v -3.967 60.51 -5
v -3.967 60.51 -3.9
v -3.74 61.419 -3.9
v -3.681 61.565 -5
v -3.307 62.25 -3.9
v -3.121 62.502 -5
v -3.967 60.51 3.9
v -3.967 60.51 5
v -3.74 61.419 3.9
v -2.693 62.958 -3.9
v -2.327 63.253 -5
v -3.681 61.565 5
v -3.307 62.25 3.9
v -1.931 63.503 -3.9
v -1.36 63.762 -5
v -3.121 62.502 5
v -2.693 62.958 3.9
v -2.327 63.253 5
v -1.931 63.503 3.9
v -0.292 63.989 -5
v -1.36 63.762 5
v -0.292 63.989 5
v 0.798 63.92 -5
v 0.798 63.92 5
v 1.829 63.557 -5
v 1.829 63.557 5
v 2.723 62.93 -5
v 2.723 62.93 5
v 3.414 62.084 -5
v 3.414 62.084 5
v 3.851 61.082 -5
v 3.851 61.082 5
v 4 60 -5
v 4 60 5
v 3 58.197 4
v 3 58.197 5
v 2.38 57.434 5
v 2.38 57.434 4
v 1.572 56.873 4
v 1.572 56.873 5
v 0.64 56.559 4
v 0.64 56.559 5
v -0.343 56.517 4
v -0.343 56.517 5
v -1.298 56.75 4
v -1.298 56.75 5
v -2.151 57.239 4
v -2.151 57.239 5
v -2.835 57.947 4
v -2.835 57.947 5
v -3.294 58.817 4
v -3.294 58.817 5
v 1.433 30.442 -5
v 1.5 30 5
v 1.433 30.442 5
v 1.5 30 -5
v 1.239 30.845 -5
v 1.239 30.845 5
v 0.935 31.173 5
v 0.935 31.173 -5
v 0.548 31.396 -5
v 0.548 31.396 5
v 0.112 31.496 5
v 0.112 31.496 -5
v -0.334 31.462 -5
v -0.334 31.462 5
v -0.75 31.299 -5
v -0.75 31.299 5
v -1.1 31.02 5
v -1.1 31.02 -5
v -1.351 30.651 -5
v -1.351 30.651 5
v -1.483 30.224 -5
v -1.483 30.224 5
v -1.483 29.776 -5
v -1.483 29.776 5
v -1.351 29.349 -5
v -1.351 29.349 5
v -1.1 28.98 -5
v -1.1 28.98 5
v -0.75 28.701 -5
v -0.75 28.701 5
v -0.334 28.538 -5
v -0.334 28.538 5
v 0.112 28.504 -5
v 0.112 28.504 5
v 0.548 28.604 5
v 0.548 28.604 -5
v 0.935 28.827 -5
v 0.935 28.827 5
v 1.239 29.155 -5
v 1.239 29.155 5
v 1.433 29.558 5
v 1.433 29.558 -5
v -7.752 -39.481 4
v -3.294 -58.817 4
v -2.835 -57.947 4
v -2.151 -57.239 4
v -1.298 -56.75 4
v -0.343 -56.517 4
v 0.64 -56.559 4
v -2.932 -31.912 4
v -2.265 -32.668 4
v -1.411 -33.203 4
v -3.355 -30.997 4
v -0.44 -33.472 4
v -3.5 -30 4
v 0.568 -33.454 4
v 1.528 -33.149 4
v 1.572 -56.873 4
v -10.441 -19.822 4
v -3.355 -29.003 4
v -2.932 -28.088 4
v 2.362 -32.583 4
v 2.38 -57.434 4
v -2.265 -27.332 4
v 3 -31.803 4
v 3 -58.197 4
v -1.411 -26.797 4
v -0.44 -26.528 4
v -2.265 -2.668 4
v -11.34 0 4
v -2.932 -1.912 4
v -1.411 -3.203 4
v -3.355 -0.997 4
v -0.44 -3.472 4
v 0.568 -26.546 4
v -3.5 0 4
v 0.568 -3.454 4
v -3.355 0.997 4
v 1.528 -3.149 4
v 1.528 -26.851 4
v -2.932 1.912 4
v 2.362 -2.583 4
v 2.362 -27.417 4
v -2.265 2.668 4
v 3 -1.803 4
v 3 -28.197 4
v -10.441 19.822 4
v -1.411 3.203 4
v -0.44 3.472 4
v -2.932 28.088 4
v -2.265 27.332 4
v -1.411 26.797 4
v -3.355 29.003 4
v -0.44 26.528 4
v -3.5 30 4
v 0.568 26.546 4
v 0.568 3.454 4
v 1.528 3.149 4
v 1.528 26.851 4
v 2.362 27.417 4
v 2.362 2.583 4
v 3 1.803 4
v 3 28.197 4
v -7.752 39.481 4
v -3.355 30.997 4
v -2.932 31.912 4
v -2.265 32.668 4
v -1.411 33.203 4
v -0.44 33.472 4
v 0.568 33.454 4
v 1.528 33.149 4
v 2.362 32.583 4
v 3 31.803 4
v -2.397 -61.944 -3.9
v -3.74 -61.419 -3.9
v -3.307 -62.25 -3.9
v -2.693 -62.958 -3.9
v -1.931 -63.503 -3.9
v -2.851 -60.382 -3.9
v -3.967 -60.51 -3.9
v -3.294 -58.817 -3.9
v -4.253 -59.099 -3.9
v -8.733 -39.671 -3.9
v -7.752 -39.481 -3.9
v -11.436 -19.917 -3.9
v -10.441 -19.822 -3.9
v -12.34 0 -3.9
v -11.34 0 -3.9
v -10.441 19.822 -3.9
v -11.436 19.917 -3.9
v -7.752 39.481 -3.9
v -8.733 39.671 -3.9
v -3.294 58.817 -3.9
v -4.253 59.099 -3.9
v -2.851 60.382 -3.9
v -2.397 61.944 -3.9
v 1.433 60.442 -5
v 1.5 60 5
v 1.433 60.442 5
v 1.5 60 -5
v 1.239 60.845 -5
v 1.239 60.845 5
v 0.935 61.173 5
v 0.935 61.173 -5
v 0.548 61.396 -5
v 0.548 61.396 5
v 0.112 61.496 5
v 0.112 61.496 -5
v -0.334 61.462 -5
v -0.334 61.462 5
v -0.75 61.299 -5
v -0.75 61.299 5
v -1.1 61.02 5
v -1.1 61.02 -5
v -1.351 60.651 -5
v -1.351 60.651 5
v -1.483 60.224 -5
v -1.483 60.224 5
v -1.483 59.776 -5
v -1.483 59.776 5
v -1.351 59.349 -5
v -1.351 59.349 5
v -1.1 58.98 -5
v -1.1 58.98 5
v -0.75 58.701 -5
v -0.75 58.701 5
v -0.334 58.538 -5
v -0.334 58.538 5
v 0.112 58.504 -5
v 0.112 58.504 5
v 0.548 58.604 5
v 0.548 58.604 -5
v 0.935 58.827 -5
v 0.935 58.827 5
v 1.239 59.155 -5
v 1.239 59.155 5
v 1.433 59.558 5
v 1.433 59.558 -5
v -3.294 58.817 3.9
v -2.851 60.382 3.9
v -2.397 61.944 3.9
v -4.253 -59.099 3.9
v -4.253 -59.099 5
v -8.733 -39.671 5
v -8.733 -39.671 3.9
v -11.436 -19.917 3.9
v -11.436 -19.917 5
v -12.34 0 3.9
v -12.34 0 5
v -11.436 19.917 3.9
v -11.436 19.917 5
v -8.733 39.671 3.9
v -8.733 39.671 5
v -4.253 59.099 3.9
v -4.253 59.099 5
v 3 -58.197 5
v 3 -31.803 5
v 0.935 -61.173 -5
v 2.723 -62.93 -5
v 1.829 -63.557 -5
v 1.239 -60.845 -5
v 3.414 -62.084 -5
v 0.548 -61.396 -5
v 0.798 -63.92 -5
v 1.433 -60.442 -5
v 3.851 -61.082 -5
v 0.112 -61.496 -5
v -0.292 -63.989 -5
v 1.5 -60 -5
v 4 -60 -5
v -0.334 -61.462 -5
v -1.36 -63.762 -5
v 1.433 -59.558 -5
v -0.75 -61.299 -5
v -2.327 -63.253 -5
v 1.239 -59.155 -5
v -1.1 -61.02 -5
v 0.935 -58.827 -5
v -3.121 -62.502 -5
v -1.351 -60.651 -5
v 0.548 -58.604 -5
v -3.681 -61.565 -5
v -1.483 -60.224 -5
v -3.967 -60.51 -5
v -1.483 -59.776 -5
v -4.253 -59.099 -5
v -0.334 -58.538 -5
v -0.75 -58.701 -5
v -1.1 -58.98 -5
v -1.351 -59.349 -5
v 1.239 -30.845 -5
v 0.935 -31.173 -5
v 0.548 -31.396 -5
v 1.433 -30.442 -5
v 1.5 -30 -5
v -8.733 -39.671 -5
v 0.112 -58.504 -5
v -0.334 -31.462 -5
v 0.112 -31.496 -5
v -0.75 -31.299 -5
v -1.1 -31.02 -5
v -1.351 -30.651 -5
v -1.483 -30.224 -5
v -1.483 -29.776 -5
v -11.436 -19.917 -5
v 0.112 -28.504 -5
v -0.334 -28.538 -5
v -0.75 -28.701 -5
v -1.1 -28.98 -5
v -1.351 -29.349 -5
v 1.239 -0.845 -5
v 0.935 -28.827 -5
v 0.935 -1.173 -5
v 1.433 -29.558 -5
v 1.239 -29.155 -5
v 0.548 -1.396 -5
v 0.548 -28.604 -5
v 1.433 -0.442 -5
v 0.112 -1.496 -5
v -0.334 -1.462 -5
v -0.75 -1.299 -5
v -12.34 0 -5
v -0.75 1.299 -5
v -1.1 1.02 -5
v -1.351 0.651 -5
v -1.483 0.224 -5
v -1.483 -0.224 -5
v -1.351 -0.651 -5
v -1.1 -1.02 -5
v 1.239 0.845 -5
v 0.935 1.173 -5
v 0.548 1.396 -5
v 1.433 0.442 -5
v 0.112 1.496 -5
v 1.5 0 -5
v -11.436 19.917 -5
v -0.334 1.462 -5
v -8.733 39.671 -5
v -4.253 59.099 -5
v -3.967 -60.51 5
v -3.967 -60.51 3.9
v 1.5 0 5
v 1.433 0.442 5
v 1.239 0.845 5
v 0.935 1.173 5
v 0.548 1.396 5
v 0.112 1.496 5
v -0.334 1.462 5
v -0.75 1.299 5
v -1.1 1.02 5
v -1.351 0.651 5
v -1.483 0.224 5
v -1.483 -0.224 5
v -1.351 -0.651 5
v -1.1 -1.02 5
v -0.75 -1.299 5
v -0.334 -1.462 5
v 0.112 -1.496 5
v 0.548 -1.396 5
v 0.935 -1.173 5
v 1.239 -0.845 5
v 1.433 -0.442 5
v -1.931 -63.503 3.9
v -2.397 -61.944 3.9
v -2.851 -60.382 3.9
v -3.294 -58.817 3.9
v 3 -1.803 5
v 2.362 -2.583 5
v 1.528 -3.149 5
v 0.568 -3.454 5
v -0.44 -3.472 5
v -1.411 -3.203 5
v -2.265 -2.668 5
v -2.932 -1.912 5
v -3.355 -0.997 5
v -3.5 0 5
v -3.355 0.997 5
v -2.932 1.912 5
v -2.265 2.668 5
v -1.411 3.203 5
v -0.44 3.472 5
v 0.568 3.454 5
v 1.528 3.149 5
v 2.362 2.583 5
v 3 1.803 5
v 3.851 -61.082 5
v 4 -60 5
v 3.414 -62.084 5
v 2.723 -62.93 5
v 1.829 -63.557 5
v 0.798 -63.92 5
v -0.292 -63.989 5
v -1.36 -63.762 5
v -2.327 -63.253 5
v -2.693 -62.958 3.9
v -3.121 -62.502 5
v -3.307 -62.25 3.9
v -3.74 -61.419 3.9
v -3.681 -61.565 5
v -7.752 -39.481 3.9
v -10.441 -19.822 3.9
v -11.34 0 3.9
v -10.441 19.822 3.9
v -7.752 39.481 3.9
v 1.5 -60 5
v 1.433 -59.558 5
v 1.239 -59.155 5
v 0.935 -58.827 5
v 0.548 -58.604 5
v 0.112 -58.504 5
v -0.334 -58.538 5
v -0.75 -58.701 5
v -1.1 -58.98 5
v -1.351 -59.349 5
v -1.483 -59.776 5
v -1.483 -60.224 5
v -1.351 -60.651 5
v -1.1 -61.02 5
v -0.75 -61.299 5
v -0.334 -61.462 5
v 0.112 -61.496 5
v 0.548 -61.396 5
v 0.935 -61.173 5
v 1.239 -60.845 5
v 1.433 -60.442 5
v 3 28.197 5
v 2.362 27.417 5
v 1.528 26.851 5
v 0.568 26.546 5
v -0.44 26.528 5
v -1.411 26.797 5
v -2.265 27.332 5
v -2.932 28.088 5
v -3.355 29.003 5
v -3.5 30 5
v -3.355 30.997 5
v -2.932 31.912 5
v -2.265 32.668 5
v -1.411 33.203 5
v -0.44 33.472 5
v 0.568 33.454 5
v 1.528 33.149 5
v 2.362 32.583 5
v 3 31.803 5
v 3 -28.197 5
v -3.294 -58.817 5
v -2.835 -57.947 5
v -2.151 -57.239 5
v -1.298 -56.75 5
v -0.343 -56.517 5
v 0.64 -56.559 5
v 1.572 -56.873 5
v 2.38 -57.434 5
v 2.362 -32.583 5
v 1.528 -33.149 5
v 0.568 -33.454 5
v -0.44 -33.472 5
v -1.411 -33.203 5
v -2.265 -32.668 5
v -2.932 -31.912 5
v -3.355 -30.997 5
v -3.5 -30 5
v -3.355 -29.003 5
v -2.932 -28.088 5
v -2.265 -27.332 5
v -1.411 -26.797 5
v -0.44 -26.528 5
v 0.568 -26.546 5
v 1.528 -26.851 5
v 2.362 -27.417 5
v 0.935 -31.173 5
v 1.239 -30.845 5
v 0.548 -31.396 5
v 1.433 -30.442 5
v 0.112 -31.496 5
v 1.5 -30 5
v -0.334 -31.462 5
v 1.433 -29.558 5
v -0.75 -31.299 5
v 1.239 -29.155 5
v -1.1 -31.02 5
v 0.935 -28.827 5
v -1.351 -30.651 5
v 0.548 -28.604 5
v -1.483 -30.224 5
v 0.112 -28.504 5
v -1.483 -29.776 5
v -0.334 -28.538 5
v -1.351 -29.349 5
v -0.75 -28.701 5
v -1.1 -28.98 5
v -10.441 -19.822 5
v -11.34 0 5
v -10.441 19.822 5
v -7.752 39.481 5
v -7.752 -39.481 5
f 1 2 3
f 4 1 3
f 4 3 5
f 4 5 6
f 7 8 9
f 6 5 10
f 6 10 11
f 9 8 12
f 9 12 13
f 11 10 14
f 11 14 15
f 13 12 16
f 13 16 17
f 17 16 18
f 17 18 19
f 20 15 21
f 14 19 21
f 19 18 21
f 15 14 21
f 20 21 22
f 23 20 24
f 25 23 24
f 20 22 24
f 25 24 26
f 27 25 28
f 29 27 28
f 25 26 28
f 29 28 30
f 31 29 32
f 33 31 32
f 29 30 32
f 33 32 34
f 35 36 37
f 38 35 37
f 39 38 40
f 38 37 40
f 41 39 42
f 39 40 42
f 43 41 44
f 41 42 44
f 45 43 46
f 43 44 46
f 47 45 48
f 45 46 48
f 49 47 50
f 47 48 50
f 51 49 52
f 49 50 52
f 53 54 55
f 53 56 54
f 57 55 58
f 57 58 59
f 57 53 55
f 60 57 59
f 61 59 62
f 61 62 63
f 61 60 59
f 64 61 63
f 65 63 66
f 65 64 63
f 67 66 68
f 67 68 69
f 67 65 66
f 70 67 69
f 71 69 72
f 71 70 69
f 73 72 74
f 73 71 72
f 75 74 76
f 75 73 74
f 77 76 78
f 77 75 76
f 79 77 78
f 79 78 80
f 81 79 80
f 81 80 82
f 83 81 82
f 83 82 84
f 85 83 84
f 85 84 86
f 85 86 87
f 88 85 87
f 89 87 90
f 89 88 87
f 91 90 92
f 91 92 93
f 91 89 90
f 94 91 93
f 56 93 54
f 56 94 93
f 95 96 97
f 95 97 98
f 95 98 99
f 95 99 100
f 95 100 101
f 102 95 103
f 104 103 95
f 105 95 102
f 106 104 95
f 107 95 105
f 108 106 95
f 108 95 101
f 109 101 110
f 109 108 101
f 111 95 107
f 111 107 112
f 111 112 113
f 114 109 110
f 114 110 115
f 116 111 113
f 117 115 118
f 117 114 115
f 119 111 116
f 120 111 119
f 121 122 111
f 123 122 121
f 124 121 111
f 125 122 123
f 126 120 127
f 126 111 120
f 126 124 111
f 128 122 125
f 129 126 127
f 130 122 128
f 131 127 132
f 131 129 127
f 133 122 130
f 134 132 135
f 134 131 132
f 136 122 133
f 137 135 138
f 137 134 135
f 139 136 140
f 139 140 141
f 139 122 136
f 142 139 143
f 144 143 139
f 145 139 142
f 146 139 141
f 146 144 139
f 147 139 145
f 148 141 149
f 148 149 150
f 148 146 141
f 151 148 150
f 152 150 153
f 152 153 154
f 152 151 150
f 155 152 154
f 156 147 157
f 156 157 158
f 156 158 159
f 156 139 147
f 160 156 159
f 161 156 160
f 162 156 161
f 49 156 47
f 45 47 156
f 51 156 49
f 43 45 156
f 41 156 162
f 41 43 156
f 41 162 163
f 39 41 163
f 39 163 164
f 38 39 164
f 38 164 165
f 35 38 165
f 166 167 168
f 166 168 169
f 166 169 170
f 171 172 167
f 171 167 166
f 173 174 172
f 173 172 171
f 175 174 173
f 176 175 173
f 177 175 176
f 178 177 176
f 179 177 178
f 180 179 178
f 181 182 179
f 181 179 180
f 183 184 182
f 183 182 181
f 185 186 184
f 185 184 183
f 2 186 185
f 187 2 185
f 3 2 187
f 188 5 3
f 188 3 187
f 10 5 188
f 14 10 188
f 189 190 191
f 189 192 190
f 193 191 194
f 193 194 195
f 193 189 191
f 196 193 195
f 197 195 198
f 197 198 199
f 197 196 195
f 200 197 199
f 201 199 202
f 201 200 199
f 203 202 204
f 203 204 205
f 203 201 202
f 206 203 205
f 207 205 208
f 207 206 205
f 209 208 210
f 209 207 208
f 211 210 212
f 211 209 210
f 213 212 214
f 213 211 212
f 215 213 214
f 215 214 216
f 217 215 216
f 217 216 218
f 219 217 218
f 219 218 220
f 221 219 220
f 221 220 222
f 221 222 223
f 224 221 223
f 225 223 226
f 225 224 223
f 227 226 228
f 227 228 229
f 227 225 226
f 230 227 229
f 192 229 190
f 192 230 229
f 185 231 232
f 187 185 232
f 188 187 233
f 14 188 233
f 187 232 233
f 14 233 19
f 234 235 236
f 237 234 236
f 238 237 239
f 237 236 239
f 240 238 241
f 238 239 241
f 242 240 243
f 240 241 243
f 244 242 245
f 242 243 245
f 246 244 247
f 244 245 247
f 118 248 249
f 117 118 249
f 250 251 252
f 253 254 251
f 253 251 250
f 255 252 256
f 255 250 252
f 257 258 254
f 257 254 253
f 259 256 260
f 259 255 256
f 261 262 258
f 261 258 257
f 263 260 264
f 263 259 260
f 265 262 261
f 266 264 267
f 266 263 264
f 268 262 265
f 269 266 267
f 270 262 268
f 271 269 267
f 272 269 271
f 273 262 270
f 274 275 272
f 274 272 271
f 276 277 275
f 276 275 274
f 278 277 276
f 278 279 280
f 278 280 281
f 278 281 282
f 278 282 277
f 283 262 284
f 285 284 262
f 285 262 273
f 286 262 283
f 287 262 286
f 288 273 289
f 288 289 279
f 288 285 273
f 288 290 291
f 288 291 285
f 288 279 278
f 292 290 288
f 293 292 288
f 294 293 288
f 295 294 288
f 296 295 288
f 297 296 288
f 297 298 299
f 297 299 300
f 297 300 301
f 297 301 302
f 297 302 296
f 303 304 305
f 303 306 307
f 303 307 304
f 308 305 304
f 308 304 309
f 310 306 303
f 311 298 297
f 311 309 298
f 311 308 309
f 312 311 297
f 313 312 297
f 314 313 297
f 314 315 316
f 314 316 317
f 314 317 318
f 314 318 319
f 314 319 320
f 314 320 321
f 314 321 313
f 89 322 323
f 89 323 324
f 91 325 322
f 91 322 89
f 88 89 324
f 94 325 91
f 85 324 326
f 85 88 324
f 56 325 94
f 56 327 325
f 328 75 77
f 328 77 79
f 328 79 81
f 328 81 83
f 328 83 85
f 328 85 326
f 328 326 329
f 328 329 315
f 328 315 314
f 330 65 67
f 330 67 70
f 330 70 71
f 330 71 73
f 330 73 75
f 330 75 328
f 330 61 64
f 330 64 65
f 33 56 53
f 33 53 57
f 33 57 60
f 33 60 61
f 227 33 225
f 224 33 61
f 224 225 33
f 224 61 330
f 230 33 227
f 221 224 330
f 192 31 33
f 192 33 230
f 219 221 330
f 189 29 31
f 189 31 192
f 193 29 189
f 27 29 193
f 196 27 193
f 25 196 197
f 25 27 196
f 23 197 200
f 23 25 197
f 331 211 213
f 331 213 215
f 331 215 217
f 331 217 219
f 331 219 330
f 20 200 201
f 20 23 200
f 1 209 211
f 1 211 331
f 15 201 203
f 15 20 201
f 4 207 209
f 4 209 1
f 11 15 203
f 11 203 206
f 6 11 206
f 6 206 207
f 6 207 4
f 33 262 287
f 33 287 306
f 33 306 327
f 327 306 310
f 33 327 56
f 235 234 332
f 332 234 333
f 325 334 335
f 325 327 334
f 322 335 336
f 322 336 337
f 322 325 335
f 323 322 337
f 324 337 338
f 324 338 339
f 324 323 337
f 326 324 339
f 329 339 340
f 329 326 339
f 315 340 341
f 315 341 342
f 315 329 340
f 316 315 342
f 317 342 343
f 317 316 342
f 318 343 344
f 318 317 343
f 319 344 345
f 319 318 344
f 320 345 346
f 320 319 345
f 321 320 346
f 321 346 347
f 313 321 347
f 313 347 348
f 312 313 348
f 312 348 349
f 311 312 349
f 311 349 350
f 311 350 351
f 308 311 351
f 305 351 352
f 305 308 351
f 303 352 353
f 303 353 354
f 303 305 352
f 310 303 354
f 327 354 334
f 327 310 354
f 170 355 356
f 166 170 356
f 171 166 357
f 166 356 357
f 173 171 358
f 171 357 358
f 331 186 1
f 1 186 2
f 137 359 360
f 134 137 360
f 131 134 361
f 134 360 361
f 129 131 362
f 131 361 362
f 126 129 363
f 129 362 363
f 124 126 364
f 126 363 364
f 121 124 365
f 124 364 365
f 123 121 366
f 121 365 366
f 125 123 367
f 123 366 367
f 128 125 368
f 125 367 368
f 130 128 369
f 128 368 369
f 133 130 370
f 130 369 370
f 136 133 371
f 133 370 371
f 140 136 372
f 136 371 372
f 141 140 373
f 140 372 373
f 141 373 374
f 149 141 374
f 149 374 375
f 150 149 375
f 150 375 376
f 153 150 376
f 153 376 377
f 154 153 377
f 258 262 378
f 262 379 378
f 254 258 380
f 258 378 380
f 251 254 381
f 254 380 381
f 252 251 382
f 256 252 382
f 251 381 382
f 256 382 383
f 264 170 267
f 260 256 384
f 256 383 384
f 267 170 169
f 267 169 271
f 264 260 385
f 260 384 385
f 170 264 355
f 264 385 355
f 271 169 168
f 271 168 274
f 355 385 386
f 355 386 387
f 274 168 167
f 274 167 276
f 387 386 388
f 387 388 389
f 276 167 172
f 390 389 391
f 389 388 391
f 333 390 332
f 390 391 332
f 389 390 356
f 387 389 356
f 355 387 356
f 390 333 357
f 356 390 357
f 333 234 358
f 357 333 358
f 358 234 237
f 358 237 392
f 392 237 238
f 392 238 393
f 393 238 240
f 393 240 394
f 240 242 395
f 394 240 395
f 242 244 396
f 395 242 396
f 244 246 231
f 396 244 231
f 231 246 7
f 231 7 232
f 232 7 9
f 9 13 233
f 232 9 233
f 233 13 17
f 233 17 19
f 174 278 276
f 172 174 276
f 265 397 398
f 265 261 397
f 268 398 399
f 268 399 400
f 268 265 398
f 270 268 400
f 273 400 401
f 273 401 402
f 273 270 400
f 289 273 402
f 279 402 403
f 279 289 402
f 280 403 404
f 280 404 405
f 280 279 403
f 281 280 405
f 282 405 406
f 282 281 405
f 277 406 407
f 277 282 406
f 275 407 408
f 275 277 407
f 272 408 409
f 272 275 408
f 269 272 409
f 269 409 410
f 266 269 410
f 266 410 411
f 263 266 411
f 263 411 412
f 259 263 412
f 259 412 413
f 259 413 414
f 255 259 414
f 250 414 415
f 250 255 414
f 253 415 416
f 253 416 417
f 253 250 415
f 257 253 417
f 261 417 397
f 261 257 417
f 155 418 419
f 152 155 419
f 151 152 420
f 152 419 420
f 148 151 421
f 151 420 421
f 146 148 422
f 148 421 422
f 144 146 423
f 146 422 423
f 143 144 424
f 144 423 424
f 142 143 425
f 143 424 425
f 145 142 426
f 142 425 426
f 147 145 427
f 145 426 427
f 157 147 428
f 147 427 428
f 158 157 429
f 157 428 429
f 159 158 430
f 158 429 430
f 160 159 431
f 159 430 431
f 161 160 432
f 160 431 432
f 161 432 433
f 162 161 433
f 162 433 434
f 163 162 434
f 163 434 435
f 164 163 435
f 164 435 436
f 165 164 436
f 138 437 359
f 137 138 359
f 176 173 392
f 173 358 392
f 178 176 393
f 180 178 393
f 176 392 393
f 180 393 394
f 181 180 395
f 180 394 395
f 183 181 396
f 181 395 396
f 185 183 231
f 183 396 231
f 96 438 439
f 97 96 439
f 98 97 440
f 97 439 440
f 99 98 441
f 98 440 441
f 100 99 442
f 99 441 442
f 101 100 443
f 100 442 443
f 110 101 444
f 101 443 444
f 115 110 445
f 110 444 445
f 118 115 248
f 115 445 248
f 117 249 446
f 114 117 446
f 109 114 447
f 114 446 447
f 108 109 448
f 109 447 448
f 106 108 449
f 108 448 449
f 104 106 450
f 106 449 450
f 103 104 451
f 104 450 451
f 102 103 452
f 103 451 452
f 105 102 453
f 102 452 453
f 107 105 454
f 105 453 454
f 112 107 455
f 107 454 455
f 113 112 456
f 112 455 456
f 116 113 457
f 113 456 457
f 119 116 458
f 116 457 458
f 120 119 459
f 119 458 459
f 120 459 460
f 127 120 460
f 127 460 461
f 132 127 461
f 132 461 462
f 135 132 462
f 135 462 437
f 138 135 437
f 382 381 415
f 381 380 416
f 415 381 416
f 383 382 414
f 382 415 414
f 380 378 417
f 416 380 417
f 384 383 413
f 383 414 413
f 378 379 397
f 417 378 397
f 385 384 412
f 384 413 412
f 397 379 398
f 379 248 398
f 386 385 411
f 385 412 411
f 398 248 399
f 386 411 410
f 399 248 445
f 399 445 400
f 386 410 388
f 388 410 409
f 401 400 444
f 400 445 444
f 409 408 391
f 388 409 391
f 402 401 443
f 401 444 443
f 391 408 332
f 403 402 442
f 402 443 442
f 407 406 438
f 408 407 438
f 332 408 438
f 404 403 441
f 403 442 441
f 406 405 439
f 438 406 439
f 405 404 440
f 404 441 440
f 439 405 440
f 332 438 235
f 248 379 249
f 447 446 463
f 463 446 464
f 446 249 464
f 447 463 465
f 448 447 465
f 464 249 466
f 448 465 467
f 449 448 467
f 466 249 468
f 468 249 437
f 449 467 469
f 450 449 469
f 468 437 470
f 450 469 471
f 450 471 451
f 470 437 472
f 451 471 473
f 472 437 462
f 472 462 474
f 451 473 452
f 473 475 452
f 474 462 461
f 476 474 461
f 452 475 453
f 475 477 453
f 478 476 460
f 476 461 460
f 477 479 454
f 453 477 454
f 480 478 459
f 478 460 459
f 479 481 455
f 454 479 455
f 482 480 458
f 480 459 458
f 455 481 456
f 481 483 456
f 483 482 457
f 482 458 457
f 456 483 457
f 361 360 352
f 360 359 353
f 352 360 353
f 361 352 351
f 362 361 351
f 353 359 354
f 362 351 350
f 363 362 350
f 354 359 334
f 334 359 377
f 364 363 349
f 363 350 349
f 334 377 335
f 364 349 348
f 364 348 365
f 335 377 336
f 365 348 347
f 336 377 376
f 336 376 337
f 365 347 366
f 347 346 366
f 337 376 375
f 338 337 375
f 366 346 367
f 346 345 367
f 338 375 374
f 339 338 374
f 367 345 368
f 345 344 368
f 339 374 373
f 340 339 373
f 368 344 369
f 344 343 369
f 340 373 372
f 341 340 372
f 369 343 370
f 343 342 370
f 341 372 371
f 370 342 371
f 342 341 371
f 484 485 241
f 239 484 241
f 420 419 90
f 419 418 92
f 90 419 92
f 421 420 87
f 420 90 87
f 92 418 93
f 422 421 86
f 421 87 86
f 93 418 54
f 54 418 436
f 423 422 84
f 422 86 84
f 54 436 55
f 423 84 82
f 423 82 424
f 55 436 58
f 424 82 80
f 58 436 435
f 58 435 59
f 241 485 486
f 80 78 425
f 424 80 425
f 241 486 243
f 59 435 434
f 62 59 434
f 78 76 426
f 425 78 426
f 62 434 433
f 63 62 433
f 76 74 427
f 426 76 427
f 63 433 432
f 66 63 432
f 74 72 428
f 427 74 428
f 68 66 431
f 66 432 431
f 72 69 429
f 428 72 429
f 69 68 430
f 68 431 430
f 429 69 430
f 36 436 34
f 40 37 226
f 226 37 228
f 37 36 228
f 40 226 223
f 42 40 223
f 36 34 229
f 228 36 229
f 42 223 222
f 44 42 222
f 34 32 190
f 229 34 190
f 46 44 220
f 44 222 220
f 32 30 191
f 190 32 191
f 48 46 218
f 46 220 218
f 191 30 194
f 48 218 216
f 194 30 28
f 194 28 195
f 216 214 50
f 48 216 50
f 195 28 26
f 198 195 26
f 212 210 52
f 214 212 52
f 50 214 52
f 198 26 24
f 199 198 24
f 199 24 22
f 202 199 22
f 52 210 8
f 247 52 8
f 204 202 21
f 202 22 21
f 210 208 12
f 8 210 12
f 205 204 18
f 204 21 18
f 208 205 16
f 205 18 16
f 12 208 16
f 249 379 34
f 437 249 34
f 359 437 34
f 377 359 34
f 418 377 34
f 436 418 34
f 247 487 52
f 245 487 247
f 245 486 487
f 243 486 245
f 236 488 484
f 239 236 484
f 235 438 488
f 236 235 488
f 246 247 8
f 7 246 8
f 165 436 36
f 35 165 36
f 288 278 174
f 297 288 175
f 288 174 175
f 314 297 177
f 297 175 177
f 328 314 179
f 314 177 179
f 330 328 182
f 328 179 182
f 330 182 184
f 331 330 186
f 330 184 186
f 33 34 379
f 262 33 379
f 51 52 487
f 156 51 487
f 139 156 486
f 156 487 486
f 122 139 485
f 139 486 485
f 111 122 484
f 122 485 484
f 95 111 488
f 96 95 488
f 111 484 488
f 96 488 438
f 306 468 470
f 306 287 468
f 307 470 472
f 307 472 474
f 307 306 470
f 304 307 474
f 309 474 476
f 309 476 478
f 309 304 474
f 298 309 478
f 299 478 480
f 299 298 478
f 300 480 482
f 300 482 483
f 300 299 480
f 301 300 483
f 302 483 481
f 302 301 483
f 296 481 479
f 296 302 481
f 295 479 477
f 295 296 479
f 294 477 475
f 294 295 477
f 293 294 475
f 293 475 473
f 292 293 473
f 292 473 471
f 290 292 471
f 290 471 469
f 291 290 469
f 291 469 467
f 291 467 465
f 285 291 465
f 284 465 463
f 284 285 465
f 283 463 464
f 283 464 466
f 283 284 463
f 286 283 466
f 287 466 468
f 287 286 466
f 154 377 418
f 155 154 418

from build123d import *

# Parameters (mm, degrees)
SKETCH1_R           = 1.5
BOSS_EXTRUDE1_DEPTH = 5
FILLET1_R           = 10
CUT_EXTRUDE1_DEPTH  = 1
CUT_EXTRUDE2_DEPTH  = 3.9


with BuildPart() as part:
    # Sketch1 → Boss-Extrude1 (new, symmetric)
    with BuildSketch(Plane.XY):
        with BuildLine():
            Line((4, 60), (4, -60))
            ThreePointArc((4, -60), (0, -64), (-4, -60))
            ThreePointArc((-4, -60), (-12.339895115, 0), (-4, 60))
            ThreePointArc((-4, 60), (0, 64), (4, 60))
        make_face()
        with Locations((0, 60)):
            Circle(SKETCH1_R, mode=Mode.SUBTRACT)
        with Locations((0, 30)):
            Circle(SKETCH1_R, mode=Mode.SUBTRACT)
        with Locations((0, -30)):
            Circle(SKETCH1_R, mode=Mode.SUBTRACT)
        Circle(SKETCH1_R, mode=Mode.SUBTRACT)
        with Locations((0, -60)):
            Circle(SKETCH1_R, mode=Mode.SUBTRACT)
    extrude(amount=BOSS_EXTRUDE1_DEPTH, both=True)

    # Fillet1
    fillet1_edges = [part.edges().sort_by_distance(p)[0] for p in [
        (-4, -60, 0),
        (-4, 60, 0),
    ]]
    fillet(fillet1_edges, radius=FILLET1_R)

    # Sketch2 → Cut-Extrude1 (cut)
    with BuildSketch(Plane.XY.offset(5)):
        with BuildLine():
            ThreePointArc((-3.293906421, -58.816707776), (-0.342834029, -56.516831209), (3, -58.197224362))
            Line((3, -58.197224362), (3, -31.802775638))
            ThreePointArc((3, -31.802775638), (-3.5, -30), (3, -28.197224362))
            Line((3, -28.197224362), (3, -1.802775638))
            ThreePointArc((3, -1.802775638), (-3.5, 0), (3, 1.802775638))
            Line((3, 1.802775638), (3, 28.197224362))
            ThreePointArc((3, 28.197224362), (-3.5, 30), (3, 31.802775638))
            Line((3, 31.802775638), (3, 58.197224362))
            ThreePointArc((3, 58.197224362), (-0.342834029, 56.516831209), (-3.293906421, 58.816707776))
            ThreePointArc((-3.293906421, 58.816707776), (-11.339895115, 0), (-3.293906421, -58.816707776))
        make_face()
    extrude(amount=-CUT_EXTRUDE1_DEPTH, mode=Mode.SUBTRACT)

    # Sketch3 → Cut-Extrude2 (cut, symmetric)
    with BuildSketch(Plane.XY):
        with BuildLine():
            ThreePointArc((-3.293906421, 58.816707776), (-1.64732722, 64.431350021), (0.148659418, 70))
            Line((0.148659418, 70), (-49.851340582, 70))
            Line((-49.851340582, 70), (-49.851340582, -70))
            Line((-49.851340582, -70), (0.148659418, -70))
            ThreePointArc((0.148659418, -70), (-1.64732722, -64.431350021), (-3.293906421, -58.816707776))
            ThreePointArc((-3.293906421, -58.816707776), (-11.339895115, 0), (-3.293906421, 58.816707776))
        make_face()
    extrude(amount=CUT_EXTRUDE2_DEPTH, both=True, mode=Mode.SUBTRACT)


solid = part.part
